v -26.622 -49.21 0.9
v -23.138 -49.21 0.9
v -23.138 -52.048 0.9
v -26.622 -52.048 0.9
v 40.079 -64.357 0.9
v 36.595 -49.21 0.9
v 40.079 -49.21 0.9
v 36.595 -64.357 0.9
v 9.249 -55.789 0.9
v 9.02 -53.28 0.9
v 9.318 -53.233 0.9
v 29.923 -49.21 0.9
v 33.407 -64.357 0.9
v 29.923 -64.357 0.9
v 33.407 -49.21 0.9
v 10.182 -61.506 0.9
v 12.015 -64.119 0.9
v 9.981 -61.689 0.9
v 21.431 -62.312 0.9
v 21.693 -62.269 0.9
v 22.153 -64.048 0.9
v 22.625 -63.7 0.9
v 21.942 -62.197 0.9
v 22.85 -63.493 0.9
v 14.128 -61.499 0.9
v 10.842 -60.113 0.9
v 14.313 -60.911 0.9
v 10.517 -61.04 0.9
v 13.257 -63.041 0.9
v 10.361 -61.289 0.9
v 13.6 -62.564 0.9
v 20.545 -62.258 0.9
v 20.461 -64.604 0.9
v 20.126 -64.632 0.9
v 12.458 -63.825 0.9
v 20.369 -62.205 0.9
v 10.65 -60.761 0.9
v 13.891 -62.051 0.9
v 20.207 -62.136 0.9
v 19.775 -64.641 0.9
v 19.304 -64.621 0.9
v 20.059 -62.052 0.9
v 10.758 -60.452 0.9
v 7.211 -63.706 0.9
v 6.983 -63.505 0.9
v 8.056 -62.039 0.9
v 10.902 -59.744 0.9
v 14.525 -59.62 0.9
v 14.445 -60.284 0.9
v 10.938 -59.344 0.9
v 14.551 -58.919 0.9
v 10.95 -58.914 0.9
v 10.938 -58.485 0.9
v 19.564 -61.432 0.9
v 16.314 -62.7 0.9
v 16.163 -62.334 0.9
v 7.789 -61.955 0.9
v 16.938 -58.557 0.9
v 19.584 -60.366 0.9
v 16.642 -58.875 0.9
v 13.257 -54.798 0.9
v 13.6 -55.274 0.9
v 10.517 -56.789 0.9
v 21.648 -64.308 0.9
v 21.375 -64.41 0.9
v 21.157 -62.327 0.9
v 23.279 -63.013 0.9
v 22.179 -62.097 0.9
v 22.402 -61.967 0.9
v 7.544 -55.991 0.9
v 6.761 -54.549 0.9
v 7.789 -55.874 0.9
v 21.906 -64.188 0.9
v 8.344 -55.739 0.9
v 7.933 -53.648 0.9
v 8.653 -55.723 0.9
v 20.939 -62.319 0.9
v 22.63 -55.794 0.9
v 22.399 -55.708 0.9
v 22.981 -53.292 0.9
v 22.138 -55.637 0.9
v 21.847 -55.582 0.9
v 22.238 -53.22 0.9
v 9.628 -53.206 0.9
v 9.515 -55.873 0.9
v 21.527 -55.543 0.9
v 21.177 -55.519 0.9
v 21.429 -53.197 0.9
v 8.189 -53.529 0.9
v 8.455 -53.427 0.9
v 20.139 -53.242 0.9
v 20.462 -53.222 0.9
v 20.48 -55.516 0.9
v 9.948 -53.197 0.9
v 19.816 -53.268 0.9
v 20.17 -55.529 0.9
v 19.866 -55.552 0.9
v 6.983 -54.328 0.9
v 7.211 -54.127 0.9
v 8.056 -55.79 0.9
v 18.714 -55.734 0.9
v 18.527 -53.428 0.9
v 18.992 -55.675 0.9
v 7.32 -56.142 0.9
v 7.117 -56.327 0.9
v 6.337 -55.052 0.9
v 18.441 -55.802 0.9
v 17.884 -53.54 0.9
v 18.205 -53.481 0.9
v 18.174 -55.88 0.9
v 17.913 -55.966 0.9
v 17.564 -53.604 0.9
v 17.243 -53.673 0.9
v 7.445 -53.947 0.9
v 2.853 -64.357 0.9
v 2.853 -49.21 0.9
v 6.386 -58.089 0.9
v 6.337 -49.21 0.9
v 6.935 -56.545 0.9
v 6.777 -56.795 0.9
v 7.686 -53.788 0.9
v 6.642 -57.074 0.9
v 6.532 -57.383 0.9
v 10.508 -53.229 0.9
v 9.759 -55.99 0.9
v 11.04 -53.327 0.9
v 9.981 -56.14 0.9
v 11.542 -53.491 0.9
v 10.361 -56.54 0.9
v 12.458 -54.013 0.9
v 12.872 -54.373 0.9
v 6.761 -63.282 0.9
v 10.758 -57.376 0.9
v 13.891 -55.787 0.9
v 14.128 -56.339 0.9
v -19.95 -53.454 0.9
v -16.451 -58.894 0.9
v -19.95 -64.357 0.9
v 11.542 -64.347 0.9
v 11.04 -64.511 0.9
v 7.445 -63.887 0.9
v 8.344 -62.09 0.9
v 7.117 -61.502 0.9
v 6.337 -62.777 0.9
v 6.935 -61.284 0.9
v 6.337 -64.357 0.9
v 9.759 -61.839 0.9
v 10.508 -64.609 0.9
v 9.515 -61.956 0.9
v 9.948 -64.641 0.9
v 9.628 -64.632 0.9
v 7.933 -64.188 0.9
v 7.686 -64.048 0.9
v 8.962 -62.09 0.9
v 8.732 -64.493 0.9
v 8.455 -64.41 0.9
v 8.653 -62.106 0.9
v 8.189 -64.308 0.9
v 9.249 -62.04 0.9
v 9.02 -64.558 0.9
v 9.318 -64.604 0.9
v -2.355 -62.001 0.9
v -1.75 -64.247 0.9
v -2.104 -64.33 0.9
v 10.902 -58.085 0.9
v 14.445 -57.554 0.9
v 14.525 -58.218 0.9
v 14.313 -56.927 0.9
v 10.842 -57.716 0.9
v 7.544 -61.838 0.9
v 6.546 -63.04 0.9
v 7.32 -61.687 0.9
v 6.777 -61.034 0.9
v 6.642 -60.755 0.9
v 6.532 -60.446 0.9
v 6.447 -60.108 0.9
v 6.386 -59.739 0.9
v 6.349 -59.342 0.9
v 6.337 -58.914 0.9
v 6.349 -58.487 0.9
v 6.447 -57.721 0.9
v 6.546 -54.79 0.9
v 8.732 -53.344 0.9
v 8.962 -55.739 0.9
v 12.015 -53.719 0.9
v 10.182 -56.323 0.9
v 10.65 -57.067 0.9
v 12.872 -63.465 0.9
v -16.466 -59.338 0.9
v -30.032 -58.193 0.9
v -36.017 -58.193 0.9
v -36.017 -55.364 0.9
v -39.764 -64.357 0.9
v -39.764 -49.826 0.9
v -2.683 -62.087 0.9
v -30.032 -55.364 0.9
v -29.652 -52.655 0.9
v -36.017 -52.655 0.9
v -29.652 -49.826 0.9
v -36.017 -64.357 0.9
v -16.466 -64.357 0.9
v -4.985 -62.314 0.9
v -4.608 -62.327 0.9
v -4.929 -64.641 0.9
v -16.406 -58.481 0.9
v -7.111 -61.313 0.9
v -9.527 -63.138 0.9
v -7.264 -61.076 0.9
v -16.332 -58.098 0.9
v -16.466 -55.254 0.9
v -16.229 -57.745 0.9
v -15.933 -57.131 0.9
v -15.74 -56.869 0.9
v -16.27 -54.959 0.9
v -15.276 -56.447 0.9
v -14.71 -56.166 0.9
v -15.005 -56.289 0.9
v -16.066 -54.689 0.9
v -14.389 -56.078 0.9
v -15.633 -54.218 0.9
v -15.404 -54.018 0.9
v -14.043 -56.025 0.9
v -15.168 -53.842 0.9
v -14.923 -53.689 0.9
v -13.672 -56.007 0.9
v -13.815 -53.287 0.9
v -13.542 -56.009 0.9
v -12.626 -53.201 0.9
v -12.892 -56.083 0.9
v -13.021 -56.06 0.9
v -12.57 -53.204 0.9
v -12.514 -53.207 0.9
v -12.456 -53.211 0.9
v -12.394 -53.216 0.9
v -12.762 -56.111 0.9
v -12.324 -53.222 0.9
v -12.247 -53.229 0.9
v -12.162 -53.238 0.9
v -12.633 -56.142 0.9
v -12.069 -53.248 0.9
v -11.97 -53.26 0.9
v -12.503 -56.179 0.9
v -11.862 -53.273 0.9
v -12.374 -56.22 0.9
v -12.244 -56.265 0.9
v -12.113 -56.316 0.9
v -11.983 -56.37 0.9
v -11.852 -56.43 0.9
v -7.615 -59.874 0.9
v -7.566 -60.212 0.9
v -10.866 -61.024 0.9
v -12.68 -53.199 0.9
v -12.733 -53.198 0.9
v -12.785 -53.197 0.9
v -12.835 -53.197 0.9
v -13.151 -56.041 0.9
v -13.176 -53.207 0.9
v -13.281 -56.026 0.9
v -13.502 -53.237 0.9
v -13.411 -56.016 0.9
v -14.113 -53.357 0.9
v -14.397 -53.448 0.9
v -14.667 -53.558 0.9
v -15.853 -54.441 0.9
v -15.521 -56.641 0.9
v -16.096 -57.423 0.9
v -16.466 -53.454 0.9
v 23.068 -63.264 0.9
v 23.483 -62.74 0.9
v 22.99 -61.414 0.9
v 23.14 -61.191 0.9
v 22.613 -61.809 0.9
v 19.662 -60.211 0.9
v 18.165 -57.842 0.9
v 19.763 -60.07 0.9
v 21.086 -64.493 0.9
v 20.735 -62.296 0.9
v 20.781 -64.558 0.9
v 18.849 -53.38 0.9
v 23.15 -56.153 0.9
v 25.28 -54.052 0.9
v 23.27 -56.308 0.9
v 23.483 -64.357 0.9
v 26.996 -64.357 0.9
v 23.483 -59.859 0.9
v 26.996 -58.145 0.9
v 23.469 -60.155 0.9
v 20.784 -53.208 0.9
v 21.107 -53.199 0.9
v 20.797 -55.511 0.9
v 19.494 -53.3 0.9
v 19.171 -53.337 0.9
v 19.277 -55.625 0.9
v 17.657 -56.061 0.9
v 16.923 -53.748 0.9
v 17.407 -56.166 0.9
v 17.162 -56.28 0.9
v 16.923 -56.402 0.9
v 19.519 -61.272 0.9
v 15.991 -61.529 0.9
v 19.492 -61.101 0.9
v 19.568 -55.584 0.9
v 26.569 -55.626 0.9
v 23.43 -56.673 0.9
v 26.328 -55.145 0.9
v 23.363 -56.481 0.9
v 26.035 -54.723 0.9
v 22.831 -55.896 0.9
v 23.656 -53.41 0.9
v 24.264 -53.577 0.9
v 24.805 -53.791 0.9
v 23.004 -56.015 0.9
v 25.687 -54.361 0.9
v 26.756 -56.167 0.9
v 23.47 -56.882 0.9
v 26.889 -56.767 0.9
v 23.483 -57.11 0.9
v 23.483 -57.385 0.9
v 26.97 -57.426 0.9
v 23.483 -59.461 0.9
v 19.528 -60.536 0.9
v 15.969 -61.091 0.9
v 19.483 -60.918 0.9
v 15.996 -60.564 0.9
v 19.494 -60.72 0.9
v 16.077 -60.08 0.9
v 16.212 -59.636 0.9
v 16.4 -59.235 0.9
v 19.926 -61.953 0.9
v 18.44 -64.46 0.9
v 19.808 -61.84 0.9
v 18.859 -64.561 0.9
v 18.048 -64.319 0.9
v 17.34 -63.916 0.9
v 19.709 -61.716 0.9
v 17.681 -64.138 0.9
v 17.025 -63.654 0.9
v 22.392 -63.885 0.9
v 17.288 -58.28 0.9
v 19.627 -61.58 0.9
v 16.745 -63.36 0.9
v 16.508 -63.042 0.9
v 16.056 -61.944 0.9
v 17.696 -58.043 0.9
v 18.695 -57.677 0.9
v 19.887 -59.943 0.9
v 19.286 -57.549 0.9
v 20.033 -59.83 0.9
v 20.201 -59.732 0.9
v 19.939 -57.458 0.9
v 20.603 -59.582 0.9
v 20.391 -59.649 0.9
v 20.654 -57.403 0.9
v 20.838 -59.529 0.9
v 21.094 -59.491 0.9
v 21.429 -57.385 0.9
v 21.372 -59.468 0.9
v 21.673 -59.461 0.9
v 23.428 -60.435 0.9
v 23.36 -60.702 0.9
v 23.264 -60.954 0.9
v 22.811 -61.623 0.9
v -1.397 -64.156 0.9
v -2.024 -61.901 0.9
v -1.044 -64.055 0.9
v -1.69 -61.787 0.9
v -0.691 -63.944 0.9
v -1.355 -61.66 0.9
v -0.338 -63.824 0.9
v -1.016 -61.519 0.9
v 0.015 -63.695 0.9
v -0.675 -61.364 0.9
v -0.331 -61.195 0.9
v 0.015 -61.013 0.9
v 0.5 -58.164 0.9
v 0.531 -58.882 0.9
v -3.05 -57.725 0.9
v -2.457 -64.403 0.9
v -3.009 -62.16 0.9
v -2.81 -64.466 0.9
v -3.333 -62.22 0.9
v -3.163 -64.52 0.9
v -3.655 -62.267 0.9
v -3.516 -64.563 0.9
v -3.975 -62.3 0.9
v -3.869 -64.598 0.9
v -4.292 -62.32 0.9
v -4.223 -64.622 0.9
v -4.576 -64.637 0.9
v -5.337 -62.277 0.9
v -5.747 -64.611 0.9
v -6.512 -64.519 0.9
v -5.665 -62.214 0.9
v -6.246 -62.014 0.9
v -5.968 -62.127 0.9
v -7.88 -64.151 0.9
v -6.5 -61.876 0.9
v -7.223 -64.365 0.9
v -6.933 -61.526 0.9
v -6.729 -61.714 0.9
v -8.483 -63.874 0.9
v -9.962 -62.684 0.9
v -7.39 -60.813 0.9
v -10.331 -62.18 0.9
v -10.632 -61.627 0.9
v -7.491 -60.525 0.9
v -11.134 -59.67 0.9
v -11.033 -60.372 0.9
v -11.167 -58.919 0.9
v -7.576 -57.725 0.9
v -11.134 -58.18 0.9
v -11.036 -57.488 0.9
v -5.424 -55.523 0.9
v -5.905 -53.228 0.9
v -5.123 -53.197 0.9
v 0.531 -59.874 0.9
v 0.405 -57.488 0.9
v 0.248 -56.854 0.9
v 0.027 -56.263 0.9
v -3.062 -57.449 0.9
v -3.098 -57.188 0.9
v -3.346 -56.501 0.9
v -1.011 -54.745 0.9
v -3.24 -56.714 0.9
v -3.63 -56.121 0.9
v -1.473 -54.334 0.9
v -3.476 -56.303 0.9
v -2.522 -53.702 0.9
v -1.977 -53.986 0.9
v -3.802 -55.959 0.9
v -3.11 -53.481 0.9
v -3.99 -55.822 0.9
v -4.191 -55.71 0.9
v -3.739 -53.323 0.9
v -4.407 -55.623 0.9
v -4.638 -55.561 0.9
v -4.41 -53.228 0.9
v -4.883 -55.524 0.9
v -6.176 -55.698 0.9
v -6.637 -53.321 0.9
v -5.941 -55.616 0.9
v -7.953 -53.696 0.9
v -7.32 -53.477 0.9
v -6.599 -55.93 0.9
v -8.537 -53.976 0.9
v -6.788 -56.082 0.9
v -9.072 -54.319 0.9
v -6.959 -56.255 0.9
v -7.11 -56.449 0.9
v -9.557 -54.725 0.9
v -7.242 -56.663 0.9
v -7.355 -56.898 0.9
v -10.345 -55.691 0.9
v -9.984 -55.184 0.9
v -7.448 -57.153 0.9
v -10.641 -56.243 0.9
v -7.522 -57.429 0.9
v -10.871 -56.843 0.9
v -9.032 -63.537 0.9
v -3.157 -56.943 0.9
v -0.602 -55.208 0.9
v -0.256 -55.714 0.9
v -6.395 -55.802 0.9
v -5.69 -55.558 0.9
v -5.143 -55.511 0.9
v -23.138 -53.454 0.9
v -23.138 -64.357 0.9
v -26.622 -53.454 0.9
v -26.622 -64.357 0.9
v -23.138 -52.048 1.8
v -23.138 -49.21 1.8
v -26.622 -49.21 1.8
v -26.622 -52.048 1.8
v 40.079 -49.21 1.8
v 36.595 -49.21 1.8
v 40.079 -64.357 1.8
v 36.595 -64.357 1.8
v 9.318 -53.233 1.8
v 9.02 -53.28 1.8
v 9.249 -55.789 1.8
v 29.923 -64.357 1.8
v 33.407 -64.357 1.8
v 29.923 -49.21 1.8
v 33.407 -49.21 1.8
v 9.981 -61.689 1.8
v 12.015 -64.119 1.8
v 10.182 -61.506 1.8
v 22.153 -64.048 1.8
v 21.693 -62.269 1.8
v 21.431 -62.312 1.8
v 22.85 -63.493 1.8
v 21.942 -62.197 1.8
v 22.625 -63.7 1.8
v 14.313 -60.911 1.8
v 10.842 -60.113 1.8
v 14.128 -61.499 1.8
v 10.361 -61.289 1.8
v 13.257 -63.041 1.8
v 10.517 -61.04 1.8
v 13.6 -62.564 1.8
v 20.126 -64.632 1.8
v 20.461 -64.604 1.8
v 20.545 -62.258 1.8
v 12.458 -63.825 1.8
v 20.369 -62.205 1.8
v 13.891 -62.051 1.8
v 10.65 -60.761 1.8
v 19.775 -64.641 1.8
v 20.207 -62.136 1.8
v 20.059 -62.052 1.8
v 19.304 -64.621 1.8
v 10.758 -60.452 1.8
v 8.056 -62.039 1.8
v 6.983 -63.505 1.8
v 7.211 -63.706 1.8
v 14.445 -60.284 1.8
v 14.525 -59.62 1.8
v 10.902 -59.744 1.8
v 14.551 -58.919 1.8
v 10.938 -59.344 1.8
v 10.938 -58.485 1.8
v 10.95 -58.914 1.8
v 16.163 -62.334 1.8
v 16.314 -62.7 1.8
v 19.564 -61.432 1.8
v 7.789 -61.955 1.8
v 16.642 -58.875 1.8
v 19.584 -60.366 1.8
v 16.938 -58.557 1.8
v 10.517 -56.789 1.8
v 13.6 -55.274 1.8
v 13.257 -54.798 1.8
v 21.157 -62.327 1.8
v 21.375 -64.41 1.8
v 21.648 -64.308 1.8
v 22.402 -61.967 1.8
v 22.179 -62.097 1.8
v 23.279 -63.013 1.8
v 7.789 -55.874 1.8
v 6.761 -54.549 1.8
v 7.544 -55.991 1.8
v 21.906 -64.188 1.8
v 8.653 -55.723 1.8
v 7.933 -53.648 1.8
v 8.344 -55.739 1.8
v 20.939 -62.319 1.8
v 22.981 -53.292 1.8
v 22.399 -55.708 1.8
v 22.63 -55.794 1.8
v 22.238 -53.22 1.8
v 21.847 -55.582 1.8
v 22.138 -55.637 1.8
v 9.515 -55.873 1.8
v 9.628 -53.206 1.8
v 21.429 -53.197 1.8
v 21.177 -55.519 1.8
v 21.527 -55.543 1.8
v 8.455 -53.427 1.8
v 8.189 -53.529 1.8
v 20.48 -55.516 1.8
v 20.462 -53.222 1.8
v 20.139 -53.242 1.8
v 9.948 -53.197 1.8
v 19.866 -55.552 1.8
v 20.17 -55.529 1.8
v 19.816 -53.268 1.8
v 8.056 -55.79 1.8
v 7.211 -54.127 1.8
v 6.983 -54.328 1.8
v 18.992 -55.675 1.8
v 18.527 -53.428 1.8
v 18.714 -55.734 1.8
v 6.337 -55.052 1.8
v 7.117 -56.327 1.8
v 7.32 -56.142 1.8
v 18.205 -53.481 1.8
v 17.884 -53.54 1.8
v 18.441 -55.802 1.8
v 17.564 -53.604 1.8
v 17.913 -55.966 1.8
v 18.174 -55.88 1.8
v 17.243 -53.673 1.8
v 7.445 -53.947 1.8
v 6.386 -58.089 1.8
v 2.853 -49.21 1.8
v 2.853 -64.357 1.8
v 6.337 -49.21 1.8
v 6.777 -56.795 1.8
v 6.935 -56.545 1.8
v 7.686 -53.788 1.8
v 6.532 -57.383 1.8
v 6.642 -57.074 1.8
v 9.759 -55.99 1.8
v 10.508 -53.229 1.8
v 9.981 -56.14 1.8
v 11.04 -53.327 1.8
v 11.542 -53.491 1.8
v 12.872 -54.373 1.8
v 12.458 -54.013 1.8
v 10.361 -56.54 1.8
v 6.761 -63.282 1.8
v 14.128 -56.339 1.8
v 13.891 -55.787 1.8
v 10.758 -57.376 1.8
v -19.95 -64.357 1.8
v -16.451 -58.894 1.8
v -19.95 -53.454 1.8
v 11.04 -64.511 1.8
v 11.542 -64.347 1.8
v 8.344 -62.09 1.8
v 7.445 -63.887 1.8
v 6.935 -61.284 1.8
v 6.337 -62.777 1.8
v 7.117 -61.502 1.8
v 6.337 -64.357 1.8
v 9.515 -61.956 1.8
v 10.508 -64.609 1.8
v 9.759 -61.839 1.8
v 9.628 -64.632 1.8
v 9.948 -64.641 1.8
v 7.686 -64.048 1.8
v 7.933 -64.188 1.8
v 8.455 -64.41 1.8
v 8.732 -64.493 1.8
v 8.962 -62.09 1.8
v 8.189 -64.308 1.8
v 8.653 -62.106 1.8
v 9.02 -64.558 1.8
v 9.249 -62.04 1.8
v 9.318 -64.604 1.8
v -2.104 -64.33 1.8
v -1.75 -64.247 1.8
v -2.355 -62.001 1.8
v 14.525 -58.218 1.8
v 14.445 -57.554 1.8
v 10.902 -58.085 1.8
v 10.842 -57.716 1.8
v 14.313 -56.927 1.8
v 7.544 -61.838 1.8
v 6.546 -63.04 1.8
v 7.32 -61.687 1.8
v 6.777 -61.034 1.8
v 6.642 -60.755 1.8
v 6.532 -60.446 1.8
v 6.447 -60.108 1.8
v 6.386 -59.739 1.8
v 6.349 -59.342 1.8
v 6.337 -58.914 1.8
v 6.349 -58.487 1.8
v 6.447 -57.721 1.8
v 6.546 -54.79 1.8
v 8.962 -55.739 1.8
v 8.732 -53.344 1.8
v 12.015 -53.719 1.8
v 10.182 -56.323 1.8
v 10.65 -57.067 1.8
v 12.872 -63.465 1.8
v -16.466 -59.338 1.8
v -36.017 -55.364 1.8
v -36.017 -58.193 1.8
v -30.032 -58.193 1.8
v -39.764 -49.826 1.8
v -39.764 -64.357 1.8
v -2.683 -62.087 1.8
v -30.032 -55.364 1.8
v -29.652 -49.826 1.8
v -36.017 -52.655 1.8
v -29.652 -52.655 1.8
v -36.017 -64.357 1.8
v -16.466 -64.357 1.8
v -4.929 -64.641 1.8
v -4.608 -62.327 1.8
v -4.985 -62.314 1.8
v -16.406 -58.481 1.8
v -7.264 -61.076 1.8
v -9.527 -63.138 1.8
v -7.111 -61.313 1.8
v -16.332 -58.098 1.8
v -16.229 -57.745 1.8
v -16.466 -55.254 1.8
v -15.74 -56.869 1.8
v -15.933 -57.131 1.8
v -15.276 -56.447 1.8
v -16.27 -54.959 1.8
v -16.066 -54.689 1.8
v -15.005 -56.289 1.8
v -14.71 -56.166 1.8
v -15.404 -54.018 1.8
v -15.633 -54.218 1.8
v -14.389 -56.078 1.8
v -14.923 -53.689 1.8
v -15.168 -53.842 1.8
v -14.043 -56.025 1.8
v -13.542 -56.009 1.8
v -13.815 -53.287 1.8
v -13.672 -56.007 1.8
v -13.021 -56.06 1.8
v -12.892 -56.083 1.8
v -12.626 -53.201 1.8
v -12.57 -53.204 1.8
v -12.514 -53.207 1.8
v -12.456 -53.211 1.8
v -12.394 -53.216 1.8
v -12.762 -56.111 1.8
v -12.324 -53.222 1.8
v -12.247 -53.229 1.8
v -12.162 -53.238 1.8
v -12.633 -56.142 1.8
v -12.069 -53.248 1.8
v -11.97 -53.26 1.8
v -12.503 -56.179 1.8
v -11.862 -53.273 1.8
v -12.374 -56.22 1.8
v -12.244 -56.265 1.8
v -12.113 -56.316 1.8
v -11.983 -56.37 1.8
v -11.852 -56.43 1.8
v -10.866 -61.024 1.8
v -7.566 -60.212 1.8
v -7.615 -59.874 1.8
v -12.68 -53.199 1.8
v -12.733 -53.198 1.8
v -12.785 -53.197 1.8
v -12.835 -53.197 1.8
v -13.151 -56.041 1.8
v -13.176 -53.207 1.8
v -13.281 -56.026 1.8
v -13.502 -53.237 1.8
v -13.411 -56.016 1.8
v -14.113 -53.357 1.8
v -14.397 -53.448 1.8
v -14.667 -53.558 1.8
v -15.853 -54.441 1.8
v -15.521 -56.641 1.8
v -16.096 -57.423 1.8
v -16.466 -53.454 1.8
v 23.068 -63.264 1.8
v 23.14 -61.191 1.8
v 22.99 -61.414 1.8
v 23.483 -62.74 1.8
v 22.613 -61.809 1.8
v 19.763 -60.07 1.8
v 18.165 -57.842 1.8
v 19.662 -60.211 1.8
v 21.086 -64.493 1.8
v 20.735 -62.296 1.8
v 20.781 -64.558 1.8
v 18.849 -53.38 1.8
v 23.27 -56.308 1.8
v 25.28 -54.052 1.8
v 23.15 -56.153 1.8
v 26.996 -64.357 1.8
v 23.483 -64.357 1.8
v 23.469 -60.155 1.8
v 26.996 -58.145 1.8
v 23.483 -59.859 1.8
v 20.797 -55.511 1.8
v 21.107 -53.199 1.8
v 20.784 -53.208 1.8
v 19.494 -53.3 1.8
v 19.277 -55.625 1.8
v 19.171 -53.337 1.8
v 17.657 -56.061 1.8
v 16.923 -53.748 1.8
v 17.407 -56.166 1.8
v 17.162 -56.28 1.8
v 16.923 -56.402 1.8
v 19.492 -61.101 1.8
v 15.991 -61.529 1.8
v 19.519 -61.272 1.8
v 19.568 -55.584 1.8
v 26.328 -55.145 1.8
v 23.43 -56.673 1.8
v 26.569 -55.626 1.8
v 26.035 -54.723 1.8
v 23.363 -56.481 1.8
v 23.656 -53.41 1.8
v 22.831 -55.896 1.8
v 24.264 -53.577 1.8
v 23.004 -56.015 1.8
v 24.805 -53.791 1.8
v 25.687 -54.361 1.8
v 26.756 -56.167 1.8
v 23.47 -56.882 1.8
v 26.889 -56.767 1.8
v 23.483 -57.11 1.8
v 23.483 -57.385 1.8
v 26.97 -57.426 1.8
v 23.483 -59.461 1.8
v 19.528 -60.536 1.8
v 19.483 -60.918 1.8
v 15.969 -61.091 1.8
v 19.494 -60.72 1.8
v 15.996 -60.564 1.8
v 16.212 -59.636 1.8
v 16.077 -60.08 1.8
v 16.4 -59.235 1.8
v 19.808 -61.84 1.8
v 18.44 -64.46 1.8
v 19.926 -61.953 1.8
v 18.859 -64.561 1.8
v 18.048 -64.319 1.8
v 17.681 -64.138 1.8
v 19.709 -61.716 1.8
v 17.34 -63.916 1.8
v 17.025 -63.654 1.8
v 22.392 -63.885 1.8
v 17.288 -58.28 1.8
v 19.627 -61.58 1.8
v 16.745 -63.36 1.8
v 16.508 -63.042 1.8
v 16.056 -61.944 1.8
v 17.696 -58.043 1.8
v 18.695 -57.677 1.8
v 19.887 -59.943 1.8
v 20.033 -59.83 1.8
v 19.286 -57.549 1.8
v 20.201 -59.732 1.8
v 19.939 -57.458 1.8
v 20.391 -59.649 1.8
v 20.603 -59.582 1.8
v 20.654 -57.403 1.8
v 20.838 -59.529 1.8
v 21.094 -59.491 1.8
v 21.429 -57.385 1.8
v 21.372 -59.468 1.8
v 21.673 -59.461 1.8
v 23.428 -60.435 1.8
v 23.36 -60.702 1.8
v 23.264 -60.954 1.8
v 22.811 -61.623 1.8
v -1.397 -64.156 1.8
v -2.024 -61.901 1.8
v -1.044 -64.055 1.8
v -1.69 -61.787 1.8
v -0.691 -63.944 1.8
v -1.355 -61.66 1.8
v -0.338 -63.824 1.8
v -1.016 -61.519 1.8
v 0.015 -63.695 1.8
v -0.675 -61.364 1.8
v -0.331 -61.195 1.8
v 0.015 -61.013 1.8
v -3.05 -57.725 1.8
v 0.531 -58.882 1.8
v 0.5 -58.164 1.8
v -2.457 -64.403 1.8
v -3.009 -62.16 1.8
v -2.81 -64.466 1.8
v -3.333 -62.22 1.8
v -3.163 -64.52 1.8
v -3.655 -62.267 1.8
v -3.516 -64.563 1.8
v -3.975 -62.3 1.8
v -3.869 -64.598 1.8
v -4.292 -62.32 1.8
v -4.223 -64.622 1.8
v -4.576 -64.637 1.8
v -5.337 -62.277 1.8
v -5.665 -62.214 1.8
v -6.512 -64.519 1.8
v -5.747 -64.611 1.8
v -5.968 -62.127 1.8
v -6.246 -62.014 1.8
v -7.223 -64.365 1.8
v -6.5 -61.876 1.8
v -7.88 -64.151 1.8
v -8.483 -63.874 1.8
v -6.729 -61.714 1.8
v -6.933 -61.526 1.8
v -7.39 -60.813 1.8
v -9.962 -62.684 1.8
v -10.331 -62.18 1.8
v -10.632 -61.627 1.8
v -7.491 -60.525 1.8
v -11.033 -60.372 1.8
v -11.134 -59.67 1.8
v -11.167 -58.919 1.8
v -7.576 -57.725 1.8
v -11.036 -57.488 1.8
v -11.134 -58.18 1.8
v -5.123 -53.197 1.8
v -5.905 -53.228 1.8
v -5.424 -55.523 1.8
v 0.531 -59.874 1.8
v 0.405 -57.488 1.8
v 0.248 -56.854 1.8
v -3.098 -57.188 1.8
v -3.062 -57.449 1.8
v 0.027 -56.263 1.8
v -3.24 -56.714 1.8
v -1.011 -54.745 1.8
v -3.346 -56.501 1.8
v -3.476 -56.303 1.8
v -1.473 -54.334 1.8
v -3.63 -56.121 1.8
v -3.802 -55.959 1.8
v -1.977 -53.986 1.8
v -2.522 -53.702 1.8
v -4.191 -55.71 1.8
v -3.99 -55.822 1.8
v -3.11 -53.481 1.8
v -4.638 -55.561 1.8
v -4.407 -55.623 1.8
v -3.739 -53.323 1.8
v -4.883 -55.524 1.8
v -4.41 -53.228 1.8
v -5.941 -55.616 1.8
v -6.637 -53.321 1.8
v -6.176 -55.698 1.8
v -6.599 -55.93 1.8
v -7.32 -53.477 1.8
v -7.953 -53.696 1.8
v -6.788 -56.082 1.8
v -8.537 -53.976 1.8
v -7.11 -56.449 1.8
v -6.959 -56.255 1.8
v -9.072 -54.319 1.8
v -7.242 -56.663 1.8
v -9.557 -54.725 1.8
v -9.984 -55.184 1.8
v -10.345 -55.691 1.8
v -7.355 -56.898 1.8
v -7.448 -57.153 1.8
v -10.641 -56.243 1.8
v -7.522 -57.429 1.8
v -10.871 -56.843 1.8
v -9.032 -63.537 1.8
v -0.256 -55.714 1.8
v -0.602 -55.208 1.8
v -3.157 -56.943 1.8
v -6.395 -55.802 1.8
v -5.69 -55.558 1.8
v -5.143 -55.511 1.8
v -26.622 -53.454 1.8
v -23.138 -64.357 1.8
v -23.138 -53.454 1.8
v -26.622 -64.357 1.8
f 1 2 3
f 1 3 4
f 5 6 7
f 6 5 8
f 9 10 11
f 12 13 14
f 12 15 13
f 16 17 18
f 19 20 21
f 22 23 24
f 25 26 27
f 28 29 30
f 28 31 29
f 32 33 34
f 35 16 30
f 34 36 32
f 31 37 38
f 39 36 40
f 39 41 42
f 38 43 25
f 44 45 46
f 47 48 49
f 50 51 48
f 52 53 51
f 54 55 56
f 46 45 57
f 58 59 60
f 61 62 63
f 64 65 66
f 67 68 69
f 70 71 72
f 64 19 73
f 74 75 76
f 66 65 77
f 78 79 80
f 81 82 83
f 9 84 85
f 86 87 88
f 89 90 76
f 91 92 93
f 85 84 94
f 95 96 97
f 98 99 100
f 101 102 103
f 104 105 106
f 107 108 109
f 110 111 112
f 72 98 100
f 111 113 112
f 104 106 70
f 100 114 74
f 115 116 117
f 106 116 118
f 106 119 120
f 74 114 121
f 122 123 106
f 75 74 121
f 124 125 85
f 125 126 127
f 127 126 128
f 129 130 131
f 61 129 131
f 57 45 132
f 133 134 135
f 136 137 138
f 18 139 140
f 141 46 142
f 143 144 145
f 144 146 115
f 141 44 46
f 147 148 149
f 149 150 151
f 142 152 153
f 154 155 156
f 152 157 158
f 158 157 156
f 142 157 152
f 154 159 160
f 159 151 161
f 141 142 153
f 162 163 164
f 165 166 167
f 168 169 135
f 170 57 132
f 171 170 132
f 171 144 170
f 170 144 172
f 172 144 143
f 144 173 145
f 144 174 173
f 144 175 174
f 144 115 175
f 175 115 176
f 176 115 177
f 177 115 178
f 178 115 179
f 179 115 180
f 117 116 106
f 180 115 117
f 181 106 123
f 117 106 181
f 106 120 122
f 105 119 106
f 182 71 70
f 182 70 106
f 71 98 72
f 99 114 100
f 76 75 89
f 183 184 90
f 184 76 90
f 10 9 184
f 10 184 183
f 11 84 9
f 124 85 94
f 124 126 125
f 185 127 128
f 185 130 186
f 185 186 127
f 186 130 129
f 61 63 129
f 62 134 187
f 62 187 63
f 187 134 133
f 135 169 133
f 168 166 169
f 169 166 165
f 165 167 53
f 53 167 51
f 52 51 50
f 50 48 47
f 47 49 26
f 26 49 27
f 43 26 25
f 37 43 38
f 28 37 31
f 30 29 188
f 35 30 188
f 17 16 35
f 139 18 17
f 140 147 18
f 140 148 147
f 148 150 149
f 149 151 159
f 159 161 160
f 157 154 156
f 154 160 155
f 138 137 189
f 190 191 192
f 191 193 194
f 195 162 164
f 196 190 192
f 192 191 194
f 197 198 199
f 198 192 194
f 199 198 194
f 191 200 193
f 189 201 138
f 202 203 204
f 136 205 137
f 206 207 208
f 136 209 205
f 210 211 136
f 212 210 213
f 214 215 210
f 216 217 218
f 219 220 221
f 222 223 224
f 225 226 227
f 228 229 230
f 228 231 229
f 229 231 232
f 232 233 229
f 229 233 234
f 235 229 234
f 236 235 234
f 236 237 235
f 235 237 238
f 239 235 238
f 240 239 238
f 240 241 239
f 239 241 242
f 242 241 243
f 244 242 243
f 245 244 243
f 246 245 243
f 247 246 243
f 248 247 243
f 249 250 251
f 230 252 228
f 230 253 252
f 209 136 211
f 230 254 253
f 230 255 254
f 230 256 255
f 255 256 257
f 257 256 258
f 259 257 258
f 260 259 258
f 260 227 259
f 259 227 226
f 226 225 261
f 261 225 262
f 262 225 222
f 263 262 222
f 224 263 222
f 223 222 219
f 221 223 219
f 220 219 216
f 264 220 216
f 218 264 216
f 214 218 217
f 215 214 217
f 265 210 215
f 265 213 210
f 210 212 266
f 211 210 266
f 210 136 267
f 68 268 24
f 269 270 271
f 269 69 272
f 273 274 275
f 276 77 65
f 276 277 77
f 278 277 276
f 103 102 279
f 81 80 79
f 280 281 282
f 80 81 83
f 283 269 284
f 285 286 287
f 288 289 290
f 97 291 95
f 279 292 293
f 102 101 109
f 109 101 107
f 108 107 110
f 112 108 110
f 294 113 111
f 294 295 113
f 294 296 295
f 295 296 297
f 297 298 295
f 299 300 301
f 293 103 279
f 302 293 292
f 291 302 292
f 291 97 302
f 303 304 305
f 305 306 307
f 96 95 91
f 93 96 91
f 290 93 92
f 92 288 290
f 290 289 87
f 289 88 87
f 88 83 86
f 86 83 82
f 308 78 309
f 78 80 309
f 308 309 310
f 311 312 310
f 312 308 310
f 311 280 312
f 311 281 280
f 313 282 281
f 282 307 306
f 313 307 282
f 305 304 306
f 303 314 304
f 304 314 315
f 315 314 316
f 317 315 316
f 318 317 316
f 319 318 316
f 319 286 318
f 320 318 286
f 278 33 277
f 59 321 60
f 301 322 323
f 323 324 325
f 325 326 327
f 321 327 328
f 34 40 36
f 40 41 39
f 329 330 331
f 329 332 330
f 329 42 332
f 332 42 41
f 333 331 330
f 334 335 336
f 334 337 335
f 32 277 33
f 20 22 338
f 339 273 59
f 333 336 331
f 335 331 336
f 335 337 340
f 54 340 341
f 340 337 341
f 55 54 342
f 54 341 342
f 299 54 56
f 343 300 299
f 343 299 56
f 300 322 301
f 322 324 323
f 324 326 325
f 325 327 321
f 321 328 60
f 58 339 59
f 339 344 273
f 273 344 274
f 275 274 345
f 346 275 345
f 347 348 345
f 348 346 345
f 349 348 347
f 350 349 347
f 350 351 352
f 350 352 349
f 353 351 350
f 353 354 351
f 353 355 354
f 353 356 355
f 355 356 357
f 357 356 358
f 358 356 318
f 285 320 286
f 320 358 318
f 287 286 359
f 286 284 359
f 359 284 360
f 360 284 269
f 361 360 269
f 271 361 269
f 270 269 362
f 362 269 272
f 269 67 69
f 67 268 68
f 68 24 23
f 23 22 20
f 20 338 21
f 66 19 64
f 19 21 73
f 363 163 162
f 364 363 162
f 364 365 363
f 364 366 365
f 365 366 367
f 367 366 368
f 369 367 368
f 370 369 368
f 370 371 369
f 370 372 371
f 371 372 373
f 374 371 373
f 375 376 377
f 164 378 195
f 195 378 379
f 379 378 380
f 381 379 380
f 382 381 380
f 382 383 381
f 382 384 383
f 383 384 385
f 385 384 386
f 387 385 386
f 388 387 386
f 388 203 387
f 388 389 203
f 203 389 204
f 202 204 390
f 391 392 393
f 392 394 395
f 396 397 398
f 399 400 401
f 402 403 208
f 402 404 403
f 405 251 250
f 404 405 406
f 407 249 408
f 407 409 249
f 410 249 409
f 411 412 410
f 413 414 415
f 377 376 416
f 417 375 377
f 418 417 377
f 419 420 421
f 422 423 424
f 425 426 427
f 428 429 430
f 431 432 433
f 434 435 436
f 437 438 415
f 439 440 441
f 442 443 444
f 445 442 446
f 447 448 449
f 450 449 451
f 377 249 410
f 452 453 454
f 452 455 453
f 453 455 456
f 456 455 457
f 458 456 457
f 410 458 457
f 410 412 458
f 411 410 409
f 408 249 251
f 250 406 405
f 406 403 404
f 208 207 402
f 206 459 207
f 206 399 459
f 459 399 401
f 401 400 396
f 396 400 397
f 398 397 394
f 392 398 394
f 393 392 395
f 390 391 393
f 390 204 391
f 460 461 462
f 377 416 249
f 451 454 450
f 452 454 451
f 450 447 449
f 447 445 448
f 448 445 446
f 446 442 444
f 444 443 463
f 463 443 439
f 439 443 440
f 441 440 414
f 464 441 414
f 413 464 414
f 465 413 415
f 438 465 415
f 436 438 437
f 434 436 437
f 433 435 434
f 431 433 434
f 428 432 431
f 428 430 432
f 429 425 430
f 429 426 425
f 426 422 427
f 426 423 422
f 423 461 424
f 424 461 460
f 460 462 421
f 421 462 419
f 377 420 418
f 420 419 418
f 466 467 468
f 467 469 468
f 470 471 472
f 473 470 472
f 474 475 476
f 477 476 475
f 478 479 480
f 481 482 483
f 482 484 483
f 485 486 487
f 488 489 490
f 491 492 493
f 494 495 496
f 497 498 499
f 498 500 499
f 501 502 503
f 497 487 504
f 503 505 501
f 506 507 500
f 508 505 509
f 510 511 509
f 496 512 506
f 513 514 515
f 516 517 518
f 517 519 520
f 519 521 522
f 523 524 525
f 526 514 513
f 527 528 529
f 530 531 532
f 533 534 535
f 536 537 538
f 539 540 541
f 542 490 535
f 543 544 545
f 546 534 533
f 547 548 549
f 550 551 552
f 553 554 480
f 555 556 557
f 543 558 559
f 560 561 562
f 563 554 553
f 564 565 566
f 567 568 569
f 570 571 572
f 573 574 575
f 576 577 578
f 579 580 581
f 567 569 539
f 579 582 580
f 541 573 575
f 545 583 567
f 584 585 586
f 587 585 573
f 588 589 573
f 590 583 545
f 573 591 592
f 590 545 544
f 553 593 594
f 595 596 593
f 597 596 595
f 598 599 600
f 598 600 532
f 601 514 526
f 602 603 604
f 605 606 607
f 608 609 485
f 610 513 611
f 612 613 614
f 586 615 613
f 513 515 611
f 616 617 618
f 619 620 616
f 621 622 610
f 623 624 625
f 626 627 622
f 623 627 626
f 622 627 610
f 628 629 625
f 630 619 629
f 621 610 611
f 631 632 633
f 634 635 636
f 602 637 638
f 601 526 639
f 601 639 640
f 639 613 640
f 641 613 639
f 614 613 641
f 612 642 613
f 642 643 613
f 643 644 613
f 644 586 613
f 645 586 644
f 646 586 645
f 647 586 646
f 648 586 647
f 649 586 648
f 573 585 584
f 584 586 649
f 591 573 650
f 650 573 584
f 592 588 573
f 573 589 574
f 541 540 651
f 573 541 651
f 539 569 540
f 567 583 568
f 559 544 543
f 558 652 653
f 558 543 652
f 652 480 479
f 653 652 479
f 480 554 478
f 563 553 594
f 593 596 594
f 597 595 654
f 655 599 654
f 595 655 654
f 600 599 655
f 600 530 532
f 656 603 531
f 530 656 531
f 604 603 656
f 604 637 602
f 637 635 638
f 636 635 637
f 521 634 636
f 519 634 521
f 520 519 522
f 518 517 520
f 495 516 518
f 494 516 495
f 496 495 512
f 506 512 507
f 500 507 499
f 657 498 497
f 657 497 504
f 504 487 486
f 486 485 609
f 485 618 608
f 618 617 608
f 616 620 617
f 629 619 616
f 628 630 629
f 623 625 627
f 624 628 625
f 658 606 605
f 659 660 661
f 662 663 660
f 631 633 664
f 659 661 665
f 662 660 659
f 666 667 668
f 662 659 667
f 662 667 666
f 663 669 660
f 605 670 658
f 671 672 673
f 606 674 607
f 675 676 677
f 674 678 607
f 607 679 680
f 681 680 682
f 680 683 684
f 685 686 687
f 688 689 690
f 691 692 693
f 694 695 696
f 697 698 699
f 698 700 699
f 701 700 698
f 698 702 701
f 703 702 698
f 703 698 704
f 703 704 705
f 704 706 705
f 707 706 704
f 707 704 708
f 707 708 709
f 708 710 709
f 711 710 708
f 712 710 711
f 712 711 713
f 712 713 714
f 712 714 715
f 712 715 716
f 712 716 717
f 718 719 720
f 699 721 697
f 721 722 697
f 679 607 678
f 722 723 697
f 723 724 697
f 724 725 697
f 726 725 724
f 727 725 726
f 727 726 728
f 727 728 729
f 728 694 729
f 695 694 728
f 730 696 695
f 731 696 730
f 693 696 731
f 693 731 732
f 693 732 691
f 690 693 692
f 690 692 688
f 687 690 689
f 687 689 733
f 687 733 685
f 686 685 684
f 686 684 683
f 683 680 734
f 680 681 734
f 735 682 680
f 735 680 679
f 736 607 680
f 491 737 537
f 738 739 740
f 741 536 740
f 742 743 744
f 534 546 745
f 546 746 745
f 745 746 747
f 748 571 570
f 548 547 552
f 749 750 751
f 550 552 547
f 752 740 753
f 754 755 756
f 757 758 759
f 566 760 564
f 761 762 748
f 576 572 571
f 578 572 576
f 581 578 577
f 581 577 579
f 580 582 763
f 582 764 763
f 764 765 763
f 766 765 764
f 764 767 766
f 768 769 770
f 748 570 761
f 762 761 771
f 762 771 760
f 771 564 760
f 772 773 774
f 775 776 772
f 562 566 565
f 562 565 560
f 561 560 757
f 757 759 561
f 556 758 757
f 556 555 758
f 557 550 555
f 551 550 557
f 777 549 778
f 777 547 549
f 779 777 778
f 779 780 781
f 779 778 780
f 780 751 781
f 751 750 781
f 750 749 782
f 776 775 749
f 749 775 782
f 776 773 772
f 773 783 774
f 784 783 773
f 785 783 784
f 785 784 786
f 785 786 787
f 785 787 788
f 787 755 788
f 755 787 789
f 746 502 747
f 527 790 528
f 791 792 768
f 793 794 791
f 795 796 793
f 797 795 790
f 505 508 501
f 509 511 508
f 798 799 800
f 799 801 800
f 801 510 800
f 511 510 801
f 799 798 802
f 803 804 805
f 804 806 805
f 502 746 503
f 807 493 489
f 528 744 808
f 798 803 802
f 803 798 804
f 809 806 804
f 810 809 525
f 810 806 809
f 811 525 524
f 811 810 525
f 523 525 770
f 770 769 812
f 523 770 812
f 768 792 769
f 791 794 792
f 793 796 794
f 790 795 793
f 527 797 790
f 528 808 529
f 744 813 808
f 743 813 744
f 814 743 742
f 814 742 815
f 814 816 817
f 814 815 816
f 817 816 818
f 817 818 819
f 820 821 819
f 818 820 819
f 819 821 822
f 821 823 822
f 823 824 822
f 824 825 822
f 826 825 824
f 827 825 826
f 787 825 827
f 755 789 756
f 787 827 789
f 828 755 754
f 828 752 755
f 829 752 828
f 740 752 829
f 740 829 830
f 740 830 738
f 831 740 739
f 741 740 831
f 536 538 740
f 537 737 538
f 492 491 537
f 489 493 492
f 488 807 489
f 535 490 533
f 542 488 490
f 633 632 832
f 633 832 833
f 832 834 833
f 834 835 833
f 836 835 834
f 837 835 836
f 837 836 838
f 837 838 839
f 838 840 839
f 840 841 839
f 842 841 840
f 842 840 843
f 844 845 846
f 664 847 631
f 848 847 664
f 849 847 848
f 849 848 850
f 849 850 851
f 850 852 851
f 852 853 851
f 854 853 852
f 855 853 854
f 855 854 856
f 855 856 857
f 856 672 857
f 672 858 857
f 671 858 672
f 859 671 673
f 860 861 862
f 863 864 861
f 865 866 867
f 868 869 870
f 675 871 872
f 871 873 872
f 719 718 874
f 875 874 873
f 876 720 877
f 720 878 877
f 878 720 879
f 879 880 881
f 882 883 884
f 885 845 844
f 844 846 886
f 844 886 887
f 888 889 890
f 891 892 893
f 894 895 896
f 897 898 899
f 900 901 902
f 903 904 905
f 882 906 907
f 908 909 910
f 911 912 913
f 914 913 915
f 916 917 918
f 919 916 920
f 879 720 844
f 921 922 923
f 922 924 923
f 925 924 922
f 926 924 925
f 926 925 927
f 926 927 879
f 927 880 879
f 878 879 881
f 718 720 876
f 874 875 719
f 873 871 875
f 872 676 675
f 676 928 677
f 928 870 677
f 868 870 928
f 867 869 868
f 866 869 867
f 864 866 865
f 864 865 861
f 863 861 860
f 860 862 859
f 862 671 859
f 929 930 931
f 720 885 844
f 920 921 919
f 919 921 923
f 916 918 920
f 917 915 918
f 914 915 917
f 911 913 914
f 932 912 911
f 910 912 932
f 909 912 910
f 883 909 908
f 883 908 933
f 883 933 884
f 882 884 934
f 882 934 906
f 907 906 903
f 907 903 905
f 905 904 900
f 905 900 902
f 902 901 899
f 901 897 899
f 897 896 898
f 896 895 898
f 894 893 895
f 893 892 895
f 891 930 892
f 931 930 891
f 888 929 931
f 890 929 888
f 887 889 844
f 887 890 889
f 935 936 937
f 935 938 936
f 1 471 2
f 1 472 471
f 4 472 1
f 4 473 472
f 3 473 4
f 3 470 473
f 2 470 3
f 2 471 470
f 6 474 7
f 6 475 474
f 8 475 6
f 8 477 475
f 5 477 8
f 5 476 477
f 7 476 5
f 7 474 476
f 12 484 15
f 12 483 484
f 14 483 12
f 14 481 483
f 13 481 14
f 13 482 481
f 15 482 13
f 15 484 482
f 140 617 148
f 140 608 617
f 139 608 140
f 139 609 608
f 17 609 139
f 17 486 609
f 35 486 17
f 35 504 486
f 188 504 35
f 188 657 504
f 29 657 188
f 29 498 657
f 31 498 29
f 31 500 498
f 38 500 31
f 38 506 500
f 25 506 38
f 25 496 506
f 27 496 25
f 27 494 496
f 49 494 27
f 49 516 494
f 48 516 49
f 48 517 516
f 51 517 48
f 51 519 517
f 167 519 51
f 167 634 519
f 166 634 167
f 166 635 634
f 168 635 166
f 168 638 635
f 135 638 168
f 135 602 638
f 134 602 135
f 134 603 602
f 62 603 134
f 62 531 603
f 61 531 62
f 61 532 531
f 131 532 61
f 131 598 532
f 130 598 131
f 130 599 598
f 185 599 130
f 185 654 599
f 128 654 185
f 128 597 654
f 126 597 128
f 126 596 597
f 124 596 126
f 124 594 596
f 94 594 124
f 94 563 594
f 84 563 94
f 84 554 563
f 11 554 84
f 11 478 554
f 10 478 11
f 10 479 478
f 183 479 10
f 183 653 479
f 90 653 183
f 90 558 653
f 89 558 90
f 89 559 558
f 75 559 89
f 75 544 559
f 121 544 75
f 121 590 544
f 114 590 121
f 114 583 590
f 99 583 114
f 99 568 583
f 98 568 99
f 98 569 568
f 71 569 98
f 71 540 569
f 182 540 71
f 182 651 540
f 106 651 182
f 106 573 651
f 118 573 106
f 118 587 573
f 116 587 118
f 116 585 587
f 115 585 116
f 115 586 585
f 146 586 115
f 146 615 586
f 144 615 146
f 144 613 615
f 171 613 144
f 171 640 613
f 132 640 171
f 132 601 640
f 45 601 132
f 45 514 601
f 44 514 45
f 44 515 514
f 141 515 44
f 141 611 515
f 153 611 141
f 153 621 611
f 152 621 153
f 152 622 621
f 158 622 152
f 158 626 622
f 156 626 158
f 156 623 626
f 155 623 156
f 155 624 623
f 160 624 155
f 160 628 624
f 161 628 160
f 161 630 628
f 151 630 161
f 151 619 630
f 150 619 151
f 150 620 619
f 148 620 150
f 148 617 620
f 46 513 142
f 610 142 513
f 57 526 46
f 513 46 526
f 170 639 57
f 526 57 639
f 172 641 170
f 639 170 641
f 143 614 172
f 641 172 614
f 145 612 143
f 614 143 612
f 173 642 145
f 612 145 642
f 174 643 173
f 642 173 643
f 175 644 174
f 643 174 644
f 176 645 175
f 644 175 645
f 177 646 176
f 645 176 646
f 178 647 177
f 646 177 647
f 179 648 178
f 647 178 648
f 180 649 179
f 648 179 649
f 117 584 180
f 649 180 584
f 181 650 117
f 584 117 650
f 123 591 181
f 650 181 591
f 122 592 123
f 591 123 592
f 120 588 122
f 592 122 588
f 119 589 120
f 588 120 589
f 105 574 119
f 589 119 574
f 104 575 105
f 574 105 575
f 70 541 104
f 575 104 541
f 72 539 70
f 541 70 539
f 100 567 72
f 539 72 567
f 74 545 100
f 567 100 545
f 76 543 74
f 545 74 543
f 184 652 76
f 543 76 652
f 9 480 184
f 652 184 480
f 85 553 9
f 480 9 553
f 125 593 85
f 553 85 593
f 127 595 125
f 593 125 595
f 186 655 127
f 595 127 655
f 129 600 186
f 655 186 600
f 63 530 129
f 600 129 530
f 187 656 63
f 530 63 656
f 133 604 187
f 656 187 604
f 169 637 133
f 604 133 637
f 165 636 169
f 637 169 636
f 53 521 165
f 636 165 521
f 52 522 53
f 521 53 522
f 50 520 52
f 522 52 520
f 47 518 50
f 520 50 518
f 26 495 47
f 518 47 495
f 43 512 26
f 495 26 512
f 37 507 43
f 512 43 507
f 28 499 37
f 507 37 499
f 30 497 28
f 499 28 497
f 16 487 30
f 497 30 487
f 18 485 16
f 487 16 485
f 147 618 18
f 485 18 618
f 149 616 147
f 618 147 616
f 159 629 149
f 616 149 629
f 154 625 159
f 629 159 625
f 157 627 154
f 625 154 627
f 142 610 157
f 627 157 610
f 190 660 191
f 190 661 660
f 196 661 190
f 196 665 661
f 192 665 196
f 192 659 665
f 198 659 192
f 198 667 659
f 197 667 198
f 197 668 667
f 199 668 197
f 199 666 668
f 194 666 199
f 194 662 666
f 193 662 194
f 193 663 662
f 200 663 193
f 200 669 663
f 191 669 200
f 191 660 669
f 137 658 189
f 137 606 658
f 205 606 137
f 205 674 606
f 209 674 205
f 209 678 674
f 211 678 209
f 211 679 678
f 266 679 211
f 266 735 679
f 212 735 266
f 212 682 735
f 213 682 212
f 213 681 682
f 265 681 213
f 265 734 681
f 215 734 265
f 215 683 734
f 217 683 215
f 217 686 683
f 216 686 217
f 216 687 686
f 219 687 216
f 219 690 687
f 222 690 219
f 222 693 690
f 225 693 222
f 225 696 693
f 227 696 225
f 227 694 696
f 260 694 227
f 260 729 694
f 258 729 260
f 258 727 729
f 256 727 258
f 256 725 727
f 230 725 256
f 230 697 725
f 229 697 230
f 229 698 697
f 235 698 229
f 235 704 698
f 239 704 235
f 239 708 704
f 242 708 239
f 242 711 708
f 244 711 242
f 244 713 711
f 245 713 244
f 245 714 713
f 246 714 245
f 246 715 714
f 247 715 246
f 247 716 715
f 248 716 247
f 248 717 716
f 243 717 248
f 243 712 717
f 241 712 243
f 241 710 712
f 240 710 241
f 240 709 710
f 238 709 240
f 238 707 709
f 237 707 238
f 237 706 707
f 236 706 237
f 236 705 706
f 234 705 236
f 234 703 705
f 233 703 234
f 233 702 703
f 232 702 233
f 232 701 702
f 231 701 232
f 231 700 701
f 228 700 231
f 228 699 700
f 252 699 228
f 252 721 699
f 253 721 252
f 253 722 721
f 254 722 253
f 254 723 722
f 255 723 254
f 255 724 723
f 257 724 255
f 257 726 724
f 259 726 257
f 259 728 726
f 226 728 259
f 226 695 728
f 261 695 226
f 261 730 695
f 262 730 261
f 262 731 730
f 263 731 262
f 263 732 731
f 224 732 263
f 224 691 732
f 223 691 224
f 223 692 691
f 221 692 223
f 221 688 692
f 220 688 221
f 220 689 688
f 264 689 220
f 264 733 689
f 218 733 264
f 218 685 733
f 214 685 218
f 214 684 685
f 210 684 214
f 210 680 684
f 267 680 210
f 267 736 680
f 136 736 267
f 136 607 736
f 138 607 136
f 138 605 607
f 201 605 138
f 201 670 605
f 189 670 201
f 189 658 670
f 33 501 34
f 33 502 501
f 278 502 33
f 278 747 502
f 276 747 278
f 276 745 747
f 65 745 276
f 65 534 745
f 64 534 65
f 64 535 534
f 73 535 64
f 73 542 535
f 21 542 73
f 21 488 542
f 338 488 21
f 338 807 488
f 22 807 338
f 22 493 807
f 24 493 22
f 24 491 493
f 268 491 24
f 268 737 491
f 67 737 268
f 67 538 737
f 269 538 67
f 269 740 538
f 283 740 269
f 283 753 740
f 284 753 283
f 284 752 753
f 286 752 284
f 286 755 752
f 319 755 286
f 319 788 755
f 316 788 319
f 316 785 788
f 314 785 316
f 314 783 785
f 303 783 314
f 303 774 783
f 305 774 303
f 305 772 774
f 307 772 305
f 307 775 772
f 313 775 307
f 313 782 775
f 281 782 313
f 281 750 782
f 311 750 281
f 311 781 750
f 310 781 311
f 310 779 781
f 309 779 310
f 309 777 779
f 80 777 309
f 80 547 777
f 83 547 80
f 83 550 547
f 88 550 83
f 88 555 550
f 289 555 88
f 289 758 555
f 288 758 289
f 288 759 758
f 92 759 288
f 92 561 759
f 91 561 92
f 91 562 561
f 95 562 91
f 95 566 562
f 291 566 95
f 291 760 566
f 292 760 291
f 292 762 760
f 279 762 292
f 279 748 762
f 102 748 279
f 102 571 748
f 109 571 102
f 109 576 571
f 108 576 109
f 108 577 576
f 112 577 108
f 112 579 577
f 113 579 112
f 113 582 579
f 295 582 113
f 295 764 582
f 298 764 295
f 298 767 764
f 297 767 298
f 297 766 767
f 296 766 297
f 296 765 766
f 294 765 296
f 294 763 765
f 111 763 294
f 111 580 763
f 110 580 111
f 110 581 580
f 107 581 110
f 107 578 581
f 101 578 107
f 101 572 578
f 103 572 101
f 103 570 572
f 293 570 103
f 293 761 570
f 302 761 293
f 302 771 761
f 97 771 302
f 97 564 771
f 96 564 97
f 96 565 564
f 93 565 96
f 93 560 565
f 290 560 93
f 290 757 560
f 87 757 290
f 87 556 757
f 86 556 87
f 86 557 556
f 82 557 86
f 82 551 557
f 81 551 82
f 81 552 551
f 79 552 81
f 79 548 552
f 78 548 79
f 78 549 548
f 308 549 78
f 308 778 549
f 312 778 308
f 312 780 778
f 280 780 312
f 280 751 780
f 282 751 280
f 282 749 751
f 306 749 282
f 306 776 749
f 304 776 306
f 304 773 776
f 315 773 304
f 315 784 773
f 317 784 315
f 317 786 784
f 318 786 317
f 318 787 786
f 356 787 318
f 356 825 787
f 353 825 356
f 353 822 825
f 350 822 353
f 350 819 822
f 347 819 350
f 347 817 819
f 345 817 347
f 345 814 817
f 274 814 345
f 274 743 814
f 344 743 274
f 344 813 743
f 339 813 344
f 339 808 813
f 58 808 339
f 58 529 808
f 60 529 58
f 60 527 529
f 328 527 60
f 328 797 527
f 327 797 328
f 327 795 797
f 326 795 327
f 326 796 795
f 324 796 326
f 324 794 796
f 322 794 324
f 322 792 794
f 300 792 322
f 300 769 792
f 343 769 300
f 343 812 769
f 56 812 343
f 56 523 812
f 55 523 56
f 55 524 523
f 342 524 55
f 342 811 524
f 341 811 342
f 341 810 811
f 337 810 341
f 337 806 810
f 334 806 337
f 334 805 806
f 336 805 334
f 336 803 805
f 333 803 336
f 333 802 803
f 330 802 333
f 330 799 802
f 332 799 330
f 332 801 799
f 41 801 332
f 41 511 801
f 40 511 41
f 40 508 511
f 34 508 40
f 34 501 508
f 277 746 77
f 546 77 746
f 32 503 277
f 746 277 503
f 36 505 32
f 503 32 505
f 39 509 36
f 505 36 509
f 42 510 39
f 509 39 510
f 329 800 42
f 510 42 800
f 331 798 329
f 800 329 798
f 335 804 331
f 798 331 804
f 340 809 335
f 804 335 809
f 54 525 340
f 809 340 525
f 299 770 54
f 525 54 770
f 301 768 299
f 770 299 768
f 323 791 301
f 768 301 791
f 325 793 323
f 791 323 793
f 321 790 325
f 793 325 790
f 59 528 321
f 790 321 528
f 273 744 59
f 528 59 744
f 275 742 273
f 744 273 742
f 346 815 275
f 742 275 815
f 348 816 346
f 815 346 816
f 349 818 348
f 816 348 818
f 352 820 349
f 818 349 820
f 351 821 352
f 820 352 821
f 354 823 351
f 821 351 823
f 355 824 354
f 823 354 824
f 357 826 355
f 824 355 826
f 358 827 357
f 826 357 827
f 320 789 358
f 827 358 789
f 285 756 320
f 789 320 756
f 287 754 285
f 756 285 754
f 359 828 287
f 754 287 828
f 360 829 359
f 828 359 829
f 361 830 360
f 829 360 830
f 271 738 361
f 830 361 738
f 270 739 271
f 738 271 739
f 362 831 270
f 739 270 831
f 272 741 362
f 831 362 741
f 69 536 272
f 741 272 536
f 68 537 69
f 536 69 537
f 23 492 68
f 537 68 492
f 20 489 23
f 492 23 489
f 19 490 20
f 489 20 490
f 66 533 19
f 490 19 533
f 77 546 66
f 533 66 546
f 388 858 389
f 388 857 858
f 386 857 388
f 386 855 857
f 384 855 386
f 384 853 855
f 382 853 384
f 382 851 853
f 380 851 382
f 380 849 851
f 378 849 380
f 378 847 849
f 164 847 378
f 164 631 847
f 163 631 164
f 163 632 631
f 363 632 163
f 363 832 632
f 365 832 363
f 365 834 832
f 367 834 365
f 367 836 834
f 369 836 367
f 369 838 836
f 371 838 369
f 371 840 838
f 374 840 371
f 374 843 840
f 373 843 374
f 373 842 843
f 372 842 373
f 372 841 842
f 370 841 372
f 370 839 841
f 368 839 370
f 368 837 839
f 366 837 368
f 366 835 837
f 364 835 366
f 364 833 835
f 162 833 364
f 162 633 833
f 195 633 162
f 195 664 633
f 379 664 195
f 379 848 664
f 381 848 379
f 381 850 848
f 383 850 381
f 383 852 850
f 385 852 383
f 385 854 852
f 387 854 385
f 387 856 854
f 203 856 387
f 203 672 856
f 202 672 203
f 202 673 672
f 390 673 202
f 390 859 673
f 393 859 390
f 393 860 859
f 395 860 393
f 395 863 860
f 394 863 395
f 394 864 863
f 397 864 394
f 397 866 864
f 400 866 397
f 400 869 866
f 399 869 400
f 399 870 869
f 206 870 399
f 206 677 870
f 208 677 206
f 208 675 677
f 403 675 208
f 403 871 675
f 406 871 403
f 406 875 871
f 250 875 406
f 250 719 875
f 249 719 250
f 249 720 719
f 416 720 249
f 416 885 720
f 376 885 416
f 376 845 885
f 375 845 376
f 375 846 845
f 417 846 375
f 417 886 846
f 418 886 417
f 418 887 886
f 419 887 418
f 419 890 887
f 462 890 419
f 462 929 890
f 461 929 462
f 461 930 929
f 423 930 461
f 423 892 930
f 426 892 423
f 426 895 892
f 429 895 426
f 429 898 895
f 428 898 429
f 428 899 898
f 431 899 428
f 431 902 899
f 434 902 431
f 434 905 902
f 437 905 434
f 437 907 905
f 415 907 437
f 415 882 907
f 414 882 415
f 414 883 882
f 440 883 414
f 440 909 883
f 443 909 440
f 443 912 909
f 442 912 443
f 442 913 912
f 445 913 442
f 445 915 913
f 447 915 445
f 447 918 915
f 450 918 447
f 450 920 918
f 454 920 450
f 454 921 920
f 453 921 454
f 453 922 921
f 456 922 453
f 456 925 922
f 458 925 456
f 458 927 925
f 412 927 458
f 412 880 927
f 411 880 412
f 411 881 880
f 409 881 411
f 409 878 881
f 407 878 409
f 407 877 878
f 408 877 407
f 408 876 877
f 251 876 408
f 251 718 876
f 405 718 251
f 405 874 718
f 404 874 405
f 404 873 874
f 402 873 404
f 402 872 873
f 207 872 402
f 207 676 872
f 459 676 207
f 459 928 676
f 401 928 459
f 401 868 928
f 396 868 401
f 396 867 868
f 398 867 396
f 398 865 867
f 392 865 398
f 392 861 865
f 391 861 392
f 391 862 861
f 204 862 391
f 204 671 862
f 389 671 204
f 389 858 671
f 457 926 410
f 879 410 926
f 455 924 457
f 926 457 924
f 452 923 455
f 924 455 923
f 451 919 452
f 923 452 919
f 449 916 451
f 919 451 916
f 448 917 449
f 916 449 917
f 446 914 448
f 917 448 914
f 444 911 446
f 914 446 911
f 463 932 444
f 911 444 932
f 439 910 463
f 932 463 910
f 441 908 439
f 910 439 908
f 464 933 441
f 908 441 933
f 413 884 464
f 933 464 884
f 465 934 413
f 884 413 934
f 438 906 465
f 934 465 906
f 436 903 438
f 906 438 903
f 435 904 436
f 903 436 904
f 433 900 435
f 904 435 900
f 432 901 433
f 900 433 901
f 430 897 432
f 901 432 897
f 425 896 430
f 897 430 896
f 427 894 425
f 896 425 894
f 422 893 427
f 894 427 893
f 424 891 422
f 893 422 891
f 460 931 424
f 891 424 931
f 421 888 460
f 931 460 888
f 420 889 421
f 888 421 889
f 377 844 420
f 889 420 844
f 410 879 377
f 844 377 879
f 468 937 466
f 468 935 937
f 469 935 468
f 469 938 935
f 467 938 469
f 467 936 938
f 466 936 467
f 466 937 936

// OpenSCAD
$fn = 48;
  // English (below bottom hole)
  translate([0, -57.100, 0.900]) linear_extrude(height=0.900) text("Fireball", size=14.352, halign="center", valign="center", font="Helvetica Neue:style=Bold");
